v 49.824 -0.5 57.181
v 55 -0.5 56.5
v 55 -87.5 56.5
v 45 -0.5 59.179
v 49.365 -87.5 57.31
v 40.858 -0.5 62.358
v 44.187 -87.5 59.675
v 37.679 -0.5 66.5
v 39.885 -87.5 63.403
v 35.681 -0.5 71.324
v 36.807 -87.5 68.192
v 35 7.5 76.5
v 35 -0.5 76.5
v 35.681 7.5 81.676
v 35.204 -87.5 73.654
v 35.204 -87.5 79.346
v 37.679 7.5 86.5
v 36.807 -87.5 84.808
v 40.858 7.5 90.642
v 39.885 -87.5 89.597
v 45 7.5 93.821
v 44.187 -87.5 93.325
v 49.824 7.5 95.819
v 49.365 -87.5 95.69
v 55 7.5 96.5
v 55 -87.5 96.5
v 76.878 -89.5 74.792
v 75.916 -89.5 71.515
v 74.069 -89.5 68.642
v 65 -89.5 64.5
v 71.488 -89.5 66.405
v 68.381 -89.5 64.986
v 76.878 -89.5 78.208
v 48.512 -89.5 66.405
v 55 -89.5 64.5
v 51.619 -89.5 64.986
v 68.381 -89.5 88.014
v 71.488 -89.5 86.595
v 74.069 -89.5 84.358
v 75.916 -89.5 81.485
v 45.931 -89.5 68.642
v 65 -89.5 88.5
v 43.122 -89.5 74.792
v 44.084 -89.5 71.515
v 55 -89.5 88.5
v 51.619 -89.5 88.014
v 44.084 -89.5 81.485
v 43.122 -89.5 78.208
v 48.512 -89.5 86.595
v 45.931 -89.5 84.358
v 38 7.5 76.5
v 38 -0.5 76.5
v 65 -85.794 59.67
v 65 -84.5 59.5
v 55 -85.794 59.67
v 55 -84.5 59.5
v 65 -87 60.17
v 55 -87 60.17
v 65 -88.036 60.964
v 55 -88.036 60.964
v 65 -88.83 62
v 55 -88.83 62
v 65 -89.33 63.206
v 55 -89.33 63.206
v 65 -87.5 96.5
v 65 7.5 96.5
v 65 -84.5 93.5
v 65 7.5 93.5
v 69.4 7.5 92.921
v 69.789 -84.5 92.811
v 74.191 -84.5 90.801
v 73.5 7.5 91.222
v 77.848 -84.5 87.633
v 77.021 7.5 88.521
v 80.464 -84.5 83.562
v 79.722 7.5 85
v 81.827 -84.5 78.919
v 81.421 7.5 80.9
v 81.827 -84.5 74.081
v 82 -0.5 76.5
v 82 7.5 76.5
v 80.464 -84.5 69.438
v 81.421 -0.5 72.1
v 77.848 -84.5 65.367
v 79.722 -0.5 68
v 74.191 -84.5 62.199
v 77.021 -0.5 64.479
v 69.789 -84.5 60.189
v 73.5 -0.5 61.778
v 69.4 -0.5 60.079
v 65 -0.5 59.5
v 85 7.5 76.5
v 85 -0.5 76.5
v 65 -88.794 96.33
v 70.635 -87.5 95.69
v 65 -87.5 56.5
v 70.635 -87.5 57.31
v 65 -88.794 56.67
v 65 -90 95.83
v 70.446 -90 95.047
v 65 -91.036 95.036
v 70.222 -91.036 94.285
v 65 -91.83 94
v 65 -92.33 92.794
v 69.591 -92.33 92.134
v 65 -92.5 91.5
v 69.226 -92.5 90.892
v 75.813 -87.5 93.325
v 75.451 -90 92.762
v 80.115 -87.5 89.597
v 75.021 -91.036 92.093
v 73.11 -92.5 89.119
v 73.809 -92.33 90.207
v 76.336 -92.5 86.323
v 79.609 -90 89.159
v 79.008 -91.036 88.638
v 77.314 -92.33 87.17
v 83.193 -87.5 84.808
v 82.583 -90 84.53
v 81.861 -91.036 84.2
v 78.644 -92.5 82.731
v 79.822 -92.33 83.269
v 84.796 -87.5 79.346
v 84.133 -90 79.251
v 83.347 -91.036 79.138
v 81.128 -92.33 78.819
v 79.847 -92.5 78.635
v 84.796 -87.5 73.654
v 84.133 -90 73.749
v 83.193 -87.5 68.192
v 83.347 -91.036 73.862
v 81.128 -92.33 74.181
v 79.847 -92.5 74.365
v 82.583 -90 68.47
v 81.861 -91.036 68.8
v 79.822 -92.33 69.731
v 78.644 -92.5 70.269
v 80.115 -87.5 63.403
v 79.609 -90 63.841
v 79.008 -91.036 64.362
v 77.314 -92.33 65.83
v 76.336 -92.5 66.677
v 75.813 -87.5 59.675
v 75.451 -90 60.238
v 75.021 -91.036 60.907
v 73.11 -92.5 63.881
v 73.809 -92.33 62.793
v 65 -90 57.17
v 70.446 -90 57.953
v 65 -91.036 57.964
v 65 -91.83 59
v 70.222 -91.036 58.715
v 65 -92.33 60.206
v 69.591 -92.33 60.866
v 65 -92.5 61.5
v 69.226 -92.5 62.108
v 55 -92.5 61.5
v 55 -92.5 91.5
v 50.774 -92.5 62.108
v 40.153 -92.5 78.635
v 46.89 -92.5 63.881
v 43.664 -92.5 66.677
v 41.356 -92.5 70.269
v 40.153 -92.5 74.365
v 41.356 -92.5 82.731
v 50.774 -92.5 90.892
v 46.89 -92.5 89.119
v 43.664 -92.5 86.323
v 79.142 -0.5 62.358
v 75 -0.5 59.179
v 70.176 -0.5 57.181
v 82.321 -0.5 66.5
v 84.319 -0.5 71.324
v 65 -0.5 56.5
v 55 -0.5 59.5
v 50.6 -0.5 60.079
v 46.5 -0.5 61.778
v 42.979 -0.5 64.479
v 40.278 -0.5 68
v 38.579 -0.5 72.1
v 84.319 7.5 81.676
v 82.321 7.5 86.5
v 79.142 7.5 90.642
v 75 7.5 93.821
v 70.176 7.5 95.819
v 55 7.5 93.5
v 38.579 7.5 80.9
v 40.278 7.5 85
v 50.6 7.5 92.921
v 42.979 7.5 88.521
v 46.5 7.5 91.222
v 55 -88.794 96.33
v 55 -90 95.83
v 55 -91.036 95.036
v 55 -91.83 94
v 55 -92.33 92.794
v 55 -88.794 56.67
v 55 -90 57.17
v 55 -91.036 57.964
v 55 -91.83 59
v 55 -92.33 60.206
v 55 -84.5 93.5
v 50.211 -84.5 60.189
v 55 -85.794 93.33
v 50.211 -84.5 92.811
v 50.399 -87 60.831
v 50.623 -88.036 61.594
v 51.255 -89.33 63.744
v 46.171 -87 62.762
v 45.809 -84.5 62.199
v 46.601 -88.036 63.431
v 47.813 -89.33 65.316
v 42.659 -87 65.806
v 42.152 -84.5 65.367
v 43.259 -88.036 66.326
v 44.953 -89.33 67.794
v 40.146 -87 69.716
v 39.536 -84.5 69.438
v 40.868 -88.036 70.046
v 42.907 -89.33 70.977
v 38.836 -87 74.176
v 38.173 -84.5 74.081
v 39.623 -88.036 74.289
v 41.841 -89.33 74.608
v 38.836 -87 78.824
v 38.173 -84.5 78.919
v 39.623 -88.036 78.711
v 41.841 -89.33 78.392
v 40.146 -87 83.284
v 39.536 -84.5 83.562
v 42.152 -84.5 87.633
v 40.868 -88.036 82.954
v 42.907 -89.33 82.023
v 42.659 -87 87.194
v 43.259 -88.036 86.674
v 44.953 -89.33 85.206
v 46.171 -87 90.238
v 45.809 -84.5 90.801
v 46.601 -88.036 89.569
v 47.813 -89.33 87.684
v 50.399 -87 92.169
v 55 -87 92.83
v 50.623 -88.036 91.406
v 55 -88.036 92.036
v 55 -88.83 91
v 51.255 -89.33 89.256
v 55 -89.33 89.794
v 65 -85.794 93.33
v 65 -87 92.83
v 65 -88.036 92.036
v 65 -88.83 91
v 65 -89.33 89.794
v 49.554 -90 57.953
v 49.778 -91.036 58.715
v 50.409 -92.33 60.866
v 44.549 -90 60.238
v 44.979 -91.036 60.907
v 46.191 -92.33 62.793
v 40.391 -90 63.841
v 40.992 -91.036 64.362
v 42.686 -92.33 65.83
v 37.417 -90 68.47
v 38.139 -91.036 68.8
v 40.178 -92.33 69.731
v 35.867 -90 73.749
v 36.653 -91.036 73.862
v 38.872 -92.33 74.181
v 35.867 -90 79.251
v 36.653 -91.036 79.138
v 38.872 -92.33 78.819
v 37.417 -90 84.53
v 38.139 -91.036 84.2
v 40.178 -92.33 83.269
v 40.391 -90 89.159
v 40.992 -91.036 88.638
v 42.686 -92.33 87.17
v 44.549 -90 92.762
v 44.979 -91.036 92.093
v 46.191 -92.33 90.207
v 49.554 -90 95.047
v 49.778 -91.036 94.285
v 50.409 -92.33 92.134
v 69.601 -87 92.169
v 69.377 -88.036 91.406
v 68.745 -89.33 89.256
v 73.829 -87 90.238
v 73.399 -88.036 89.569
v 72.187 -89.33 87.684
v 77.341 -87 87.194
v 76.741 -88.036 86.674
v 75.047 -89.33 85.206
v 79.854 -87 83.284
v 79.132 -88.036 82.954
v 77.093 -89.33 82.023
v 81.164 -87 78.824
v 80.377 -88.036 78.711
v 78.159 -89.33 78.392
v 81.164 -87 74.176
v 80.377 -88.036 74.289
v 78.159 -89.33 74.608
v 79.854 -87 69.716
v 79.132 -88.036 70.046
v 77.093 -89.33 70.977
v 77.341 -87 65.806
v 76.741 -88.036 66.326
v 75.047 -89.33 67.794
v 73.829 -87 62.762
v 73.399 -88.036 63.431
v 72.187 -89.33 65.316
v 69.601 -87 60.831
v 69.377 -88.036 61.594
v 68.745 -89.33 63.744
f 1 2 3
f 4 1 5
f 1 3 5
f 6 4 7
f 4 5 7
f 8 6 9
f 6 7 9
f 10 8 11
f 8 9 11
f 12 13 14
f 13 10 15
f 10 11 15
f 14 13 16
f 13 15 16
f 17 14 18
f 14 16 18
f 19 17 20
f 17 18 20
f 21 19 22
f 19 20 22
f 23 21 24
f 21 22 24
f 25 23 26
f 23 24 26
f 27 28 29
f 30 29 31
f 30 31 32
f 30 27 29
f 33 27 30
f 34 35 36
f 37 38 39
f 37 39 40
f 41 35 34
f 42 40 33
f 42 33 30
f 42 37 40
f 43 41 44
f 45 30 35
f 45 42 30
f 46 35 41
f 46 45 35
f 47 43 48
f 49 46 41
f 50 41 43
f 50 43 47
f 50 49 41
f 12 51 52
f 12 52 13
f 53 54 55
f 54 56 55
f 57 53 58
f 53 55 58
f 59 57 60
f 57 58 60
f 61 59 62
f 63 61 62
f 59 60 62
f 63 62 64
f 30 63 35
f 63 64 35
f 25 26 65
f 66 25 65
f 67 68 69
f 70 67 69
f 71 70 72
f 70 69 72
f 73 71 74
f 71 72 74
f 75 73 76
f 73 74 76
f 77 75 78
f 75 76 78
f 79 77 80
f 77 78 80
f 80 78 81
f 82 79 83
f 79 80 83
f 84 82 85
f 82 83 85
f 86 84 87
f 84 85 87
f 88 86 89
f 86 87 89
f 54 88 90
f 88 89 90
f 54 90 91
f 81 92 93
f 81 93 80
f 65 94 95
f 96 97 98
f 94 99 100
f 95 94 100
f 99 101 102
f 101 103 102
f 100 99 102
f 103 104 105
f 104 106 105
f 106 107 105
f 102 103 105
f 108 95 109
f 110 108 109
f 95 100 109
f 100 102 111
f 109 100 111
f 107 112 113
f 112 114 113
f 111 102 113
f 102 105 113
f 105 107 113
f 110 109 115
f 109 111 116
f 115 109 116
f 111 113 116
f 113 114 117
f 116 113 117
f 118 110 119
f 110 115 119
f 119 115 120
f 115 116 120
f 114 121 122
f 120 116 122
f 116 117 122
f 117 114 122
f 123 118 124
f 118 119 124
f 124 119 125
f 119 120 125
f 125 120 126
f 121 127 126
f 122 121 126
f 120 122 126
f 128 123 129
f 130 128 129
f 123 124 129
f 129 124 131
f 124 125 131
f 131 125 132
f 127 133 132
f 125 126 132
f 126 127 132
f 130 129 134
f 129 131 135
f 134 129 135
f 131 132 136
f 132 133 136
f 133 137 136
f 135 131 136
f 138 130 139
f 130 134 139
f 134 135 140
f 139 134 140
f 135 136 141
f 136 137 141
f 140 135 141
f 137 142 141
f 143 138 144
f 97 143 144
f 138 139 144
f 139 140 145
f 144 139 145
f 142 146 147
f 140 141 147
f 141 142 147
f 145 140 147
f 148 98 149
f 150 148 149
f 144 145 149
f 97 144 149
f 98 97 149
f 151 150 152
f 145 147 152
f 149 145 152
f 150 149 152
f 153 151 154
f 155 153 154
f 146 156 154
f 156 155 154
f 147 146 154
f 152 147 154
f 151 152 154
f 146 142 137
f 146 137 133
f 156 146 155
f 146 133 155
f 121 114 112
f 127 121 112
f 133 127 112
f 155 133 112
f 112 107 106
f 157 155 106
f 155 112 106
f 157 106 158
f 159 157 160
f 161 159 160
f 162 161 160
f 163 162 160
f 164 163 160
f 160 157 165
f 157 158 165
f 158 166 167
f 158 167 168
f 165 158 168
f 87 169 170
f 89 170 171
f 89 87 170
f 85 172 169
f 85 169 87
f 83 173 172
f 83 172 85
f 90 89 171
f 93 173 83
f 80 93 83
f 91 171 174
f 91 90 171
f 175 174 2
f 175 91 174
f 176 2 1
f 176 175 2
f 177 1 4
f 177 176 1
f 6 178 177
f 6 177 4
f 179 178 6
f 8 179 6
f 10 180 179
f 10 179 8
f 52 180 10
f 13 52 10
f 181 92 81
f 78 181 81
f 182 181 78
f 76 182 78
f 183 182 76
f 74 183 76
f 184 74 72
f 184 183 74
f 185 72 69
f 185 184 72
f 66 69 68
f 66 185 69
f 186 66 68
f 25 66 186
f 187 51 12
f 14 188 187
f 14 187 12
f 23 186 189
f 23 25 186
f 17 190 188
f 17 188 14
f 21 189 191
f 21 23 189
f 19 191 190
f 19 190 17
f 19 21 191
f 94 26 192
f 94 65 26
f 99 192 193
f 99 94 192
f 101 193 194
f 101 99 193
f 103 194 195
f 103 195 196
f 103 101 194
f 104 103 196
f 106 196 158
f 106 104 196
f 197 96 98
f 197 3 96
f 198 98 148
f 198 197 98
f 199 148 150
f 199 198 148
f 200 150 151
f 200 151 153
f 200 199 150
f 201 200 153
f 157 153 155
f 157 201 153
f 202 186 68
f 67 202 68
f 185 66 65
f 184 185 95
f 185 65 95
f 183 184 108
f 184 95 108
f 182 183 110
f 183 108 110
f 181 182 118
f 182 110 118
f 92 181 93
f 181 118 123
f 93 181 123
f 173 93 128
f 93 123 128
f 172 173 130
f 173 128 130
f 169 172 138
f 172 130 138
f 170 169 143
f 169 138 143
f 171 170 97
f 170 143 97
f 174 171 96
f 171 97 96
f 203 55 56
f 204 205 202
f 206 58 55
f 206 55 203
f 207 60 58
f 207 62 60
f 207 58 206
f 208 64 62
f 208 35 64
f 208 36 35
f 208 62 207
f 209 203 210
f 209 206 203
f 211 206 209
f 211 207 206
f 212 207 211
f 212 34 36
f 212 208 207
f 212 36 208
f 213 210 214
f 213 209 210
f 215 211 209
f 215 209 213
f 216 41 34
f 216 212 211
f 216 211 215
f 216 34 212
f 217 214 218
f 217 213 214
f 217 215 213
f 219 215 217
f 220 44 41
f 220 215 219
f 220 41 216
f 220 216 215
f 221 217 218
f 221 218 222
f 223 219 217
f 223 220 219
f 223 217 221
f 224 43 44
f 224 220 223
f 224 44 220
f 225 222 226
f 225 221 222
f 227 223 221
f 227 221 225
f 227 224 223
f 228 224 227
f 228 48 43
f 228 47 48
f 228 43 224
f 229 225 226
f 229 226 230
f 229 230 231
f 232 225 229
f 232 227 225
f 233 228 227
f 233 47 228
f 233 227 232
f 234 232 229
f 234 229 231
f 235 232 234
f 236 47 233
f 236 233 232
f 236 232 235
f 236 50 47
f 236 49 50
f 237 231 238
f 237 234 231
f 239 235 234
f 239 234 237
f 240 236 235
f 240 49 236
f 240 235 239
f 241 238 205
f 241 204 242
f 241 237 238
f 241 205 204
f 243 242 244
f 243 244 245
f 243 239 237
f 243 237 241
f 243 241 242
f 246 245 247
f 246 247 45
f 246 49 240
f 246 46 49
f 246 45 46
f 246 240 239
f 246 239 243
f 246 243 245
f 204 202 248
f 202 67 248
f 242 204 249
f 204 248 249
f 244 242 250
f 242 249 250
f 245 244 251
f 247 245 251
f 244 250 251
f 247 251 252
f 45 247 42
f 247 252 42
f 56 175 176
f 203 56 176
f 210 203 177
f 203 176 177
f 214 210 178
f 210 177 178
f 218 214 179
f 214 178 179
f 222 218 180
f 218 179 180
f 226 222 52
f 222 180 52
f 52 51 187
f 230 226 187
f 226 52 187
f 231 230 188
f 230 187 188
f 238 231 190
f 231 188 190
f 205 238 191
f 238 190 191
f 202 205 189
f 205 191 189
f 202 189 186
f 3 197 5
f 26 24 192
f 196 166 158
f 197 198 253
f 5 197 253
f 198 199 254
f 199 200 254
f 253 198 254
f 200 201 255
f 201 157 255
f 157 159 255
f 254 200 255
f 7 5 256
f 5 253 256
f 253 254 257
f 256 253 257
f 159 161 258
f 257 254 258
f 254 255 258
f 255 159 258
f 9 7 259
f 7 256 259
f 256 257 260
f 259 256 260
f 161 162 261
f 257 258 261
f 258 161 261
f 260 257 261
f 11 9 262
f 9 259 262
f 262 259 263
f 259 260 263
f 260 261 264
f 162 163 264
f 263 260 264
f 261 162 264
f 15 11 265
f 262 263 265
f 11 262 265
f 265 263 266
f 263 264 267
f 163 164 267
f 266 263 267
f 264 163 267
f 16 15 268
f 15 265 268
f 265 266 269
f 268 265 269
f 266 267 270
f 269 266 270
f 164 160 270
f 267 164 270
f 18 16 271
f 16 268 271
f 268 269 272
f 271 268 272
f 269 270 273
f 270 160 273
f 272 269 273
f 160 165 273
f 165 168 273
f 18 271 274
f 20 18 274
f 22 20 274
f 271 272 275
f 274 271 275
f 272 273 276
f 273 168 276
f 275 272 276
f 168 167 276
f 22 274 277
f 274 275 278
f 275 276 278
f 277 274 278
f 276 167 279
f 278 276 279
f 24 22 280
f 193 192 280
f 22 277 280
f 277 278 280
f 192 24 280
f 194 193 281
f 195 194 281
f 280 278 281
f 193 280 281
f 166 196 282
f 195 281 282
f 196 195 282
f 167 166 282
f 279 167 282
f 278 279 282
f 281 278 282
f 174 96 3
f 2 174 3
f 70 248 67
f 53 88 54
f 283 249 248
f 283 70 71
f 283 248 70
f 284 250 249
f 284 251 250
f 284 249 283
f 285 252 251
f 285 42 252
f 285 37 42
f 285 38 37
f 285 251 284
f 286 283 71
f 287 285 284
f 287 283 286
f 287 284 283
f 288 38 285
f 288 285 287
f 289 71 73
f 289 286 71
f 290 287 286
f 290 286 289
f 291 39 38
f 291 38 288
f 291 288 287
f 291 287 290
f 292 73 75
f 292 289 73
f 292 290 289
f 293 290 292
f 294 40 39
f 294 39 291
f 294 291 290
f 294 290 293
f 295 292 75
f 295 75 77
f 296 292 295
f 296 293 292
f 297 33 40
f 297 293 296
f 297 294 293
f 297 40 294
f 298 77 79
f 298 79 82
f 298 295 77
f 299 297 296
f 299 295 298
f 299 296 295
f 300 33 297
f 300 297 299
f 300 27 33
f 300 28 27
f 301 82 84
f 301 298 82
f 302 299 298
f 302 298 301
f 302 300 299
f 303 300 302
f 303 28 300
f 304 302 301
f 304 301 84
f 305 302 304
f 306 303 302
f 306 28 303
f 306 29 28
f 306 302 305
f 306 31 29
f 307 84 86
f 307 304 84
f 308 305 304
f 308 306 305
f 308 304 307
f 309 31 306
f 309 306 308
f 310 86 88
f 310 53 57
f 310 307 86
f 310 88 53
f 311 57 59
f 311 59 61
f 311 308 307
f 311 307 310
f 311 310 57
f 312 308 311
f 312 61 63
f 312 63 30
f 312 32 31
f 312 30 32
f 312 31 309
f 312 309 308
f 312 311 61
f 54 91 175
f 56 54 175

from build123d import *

# Parameters (mm, degrees)
PAD008_DEPTH            = 100
POCKET014_DEPTH         = 97
SKETCH025_W             = 50
SKETCH025_H             = 20
POCKET015_DEPTH         = 8
FILLET001_R             = 5
FILLET002_R             = 5
BODY007_PLACEMENT_ANGLE = 180


with BuildPart() as part:
    # Sketch023 → Pad008 (new body)
    with BuildSketch(Plane.XZ):
        with BuildLine():
            ThreePointArc((-5, 20), (-25, 0), (-5, -20))
            Line((-5, -20), (5, -20))
            ThreePointArc((5, -20), (25, 0), (5, 20))
            Line((5, 20), (-5, 20))
        make_face()
    extrude(amount=PAD008_DEPTH)

    # Sketch024 (on Face6 of Pad008) → Pocket014 (cut)
    with BuildSketch(Plane.XZ.offset(100)):
        with BuildLine():
            ThreePointArc((-5, 17), (-22, 0), (-5, -17))
            Line((-5, -17), (5, -17))
            ThreePointArc((5, -17), (22, 0), (5, 17))
            Line((5, 17), (-5, 17))
        make_face()
    extrude(amount=-POCKET014_DEPTH, mode=Mode.SUBTRACT)

    # Sketch025 (on Face5 of Pocket014) → Pocket015 (cut)
    with BuildSketch(Plane.XZ.offset(100)):
        with Locations((0, -10)):
            Rectangle(SKETCH025_W, SKETCH025_H)
    extrude(amount=-POCKET015_DEPTH, mode=Mode.SUBTRACT)

    # Fillet001
    fillet001_edges = [part.edges().sort_by_distance(p)[0] for p in [
        (-25, 0, 0),
        (0, 0, -20),
        (25, 0, 0),
        (0, 0, 20),
    ]]
    fillet(fillet001_edges, radius=FILLET001_R)

    # Fillet002
    fillet002_edges = [part.edges().sort_by_distance(p)[0] for p in [
        (-22, -3, 0),
        (0, -3, -17),
        (22, -3, 0),
        (0, -3, 17),
    ]]
    fillet(fillet002_edges, radius=FILLET002_R)


with BuildPart() as part_1:
    # Body007 placement: moved
    add(part.part.moved(Location((60, -92.5, 76.5))).rotate(Axis((60, -92.5, 76.5), (0, 0, 1)), BODY007_PLACEMENT_ANGLE))


solid = part_1.part
